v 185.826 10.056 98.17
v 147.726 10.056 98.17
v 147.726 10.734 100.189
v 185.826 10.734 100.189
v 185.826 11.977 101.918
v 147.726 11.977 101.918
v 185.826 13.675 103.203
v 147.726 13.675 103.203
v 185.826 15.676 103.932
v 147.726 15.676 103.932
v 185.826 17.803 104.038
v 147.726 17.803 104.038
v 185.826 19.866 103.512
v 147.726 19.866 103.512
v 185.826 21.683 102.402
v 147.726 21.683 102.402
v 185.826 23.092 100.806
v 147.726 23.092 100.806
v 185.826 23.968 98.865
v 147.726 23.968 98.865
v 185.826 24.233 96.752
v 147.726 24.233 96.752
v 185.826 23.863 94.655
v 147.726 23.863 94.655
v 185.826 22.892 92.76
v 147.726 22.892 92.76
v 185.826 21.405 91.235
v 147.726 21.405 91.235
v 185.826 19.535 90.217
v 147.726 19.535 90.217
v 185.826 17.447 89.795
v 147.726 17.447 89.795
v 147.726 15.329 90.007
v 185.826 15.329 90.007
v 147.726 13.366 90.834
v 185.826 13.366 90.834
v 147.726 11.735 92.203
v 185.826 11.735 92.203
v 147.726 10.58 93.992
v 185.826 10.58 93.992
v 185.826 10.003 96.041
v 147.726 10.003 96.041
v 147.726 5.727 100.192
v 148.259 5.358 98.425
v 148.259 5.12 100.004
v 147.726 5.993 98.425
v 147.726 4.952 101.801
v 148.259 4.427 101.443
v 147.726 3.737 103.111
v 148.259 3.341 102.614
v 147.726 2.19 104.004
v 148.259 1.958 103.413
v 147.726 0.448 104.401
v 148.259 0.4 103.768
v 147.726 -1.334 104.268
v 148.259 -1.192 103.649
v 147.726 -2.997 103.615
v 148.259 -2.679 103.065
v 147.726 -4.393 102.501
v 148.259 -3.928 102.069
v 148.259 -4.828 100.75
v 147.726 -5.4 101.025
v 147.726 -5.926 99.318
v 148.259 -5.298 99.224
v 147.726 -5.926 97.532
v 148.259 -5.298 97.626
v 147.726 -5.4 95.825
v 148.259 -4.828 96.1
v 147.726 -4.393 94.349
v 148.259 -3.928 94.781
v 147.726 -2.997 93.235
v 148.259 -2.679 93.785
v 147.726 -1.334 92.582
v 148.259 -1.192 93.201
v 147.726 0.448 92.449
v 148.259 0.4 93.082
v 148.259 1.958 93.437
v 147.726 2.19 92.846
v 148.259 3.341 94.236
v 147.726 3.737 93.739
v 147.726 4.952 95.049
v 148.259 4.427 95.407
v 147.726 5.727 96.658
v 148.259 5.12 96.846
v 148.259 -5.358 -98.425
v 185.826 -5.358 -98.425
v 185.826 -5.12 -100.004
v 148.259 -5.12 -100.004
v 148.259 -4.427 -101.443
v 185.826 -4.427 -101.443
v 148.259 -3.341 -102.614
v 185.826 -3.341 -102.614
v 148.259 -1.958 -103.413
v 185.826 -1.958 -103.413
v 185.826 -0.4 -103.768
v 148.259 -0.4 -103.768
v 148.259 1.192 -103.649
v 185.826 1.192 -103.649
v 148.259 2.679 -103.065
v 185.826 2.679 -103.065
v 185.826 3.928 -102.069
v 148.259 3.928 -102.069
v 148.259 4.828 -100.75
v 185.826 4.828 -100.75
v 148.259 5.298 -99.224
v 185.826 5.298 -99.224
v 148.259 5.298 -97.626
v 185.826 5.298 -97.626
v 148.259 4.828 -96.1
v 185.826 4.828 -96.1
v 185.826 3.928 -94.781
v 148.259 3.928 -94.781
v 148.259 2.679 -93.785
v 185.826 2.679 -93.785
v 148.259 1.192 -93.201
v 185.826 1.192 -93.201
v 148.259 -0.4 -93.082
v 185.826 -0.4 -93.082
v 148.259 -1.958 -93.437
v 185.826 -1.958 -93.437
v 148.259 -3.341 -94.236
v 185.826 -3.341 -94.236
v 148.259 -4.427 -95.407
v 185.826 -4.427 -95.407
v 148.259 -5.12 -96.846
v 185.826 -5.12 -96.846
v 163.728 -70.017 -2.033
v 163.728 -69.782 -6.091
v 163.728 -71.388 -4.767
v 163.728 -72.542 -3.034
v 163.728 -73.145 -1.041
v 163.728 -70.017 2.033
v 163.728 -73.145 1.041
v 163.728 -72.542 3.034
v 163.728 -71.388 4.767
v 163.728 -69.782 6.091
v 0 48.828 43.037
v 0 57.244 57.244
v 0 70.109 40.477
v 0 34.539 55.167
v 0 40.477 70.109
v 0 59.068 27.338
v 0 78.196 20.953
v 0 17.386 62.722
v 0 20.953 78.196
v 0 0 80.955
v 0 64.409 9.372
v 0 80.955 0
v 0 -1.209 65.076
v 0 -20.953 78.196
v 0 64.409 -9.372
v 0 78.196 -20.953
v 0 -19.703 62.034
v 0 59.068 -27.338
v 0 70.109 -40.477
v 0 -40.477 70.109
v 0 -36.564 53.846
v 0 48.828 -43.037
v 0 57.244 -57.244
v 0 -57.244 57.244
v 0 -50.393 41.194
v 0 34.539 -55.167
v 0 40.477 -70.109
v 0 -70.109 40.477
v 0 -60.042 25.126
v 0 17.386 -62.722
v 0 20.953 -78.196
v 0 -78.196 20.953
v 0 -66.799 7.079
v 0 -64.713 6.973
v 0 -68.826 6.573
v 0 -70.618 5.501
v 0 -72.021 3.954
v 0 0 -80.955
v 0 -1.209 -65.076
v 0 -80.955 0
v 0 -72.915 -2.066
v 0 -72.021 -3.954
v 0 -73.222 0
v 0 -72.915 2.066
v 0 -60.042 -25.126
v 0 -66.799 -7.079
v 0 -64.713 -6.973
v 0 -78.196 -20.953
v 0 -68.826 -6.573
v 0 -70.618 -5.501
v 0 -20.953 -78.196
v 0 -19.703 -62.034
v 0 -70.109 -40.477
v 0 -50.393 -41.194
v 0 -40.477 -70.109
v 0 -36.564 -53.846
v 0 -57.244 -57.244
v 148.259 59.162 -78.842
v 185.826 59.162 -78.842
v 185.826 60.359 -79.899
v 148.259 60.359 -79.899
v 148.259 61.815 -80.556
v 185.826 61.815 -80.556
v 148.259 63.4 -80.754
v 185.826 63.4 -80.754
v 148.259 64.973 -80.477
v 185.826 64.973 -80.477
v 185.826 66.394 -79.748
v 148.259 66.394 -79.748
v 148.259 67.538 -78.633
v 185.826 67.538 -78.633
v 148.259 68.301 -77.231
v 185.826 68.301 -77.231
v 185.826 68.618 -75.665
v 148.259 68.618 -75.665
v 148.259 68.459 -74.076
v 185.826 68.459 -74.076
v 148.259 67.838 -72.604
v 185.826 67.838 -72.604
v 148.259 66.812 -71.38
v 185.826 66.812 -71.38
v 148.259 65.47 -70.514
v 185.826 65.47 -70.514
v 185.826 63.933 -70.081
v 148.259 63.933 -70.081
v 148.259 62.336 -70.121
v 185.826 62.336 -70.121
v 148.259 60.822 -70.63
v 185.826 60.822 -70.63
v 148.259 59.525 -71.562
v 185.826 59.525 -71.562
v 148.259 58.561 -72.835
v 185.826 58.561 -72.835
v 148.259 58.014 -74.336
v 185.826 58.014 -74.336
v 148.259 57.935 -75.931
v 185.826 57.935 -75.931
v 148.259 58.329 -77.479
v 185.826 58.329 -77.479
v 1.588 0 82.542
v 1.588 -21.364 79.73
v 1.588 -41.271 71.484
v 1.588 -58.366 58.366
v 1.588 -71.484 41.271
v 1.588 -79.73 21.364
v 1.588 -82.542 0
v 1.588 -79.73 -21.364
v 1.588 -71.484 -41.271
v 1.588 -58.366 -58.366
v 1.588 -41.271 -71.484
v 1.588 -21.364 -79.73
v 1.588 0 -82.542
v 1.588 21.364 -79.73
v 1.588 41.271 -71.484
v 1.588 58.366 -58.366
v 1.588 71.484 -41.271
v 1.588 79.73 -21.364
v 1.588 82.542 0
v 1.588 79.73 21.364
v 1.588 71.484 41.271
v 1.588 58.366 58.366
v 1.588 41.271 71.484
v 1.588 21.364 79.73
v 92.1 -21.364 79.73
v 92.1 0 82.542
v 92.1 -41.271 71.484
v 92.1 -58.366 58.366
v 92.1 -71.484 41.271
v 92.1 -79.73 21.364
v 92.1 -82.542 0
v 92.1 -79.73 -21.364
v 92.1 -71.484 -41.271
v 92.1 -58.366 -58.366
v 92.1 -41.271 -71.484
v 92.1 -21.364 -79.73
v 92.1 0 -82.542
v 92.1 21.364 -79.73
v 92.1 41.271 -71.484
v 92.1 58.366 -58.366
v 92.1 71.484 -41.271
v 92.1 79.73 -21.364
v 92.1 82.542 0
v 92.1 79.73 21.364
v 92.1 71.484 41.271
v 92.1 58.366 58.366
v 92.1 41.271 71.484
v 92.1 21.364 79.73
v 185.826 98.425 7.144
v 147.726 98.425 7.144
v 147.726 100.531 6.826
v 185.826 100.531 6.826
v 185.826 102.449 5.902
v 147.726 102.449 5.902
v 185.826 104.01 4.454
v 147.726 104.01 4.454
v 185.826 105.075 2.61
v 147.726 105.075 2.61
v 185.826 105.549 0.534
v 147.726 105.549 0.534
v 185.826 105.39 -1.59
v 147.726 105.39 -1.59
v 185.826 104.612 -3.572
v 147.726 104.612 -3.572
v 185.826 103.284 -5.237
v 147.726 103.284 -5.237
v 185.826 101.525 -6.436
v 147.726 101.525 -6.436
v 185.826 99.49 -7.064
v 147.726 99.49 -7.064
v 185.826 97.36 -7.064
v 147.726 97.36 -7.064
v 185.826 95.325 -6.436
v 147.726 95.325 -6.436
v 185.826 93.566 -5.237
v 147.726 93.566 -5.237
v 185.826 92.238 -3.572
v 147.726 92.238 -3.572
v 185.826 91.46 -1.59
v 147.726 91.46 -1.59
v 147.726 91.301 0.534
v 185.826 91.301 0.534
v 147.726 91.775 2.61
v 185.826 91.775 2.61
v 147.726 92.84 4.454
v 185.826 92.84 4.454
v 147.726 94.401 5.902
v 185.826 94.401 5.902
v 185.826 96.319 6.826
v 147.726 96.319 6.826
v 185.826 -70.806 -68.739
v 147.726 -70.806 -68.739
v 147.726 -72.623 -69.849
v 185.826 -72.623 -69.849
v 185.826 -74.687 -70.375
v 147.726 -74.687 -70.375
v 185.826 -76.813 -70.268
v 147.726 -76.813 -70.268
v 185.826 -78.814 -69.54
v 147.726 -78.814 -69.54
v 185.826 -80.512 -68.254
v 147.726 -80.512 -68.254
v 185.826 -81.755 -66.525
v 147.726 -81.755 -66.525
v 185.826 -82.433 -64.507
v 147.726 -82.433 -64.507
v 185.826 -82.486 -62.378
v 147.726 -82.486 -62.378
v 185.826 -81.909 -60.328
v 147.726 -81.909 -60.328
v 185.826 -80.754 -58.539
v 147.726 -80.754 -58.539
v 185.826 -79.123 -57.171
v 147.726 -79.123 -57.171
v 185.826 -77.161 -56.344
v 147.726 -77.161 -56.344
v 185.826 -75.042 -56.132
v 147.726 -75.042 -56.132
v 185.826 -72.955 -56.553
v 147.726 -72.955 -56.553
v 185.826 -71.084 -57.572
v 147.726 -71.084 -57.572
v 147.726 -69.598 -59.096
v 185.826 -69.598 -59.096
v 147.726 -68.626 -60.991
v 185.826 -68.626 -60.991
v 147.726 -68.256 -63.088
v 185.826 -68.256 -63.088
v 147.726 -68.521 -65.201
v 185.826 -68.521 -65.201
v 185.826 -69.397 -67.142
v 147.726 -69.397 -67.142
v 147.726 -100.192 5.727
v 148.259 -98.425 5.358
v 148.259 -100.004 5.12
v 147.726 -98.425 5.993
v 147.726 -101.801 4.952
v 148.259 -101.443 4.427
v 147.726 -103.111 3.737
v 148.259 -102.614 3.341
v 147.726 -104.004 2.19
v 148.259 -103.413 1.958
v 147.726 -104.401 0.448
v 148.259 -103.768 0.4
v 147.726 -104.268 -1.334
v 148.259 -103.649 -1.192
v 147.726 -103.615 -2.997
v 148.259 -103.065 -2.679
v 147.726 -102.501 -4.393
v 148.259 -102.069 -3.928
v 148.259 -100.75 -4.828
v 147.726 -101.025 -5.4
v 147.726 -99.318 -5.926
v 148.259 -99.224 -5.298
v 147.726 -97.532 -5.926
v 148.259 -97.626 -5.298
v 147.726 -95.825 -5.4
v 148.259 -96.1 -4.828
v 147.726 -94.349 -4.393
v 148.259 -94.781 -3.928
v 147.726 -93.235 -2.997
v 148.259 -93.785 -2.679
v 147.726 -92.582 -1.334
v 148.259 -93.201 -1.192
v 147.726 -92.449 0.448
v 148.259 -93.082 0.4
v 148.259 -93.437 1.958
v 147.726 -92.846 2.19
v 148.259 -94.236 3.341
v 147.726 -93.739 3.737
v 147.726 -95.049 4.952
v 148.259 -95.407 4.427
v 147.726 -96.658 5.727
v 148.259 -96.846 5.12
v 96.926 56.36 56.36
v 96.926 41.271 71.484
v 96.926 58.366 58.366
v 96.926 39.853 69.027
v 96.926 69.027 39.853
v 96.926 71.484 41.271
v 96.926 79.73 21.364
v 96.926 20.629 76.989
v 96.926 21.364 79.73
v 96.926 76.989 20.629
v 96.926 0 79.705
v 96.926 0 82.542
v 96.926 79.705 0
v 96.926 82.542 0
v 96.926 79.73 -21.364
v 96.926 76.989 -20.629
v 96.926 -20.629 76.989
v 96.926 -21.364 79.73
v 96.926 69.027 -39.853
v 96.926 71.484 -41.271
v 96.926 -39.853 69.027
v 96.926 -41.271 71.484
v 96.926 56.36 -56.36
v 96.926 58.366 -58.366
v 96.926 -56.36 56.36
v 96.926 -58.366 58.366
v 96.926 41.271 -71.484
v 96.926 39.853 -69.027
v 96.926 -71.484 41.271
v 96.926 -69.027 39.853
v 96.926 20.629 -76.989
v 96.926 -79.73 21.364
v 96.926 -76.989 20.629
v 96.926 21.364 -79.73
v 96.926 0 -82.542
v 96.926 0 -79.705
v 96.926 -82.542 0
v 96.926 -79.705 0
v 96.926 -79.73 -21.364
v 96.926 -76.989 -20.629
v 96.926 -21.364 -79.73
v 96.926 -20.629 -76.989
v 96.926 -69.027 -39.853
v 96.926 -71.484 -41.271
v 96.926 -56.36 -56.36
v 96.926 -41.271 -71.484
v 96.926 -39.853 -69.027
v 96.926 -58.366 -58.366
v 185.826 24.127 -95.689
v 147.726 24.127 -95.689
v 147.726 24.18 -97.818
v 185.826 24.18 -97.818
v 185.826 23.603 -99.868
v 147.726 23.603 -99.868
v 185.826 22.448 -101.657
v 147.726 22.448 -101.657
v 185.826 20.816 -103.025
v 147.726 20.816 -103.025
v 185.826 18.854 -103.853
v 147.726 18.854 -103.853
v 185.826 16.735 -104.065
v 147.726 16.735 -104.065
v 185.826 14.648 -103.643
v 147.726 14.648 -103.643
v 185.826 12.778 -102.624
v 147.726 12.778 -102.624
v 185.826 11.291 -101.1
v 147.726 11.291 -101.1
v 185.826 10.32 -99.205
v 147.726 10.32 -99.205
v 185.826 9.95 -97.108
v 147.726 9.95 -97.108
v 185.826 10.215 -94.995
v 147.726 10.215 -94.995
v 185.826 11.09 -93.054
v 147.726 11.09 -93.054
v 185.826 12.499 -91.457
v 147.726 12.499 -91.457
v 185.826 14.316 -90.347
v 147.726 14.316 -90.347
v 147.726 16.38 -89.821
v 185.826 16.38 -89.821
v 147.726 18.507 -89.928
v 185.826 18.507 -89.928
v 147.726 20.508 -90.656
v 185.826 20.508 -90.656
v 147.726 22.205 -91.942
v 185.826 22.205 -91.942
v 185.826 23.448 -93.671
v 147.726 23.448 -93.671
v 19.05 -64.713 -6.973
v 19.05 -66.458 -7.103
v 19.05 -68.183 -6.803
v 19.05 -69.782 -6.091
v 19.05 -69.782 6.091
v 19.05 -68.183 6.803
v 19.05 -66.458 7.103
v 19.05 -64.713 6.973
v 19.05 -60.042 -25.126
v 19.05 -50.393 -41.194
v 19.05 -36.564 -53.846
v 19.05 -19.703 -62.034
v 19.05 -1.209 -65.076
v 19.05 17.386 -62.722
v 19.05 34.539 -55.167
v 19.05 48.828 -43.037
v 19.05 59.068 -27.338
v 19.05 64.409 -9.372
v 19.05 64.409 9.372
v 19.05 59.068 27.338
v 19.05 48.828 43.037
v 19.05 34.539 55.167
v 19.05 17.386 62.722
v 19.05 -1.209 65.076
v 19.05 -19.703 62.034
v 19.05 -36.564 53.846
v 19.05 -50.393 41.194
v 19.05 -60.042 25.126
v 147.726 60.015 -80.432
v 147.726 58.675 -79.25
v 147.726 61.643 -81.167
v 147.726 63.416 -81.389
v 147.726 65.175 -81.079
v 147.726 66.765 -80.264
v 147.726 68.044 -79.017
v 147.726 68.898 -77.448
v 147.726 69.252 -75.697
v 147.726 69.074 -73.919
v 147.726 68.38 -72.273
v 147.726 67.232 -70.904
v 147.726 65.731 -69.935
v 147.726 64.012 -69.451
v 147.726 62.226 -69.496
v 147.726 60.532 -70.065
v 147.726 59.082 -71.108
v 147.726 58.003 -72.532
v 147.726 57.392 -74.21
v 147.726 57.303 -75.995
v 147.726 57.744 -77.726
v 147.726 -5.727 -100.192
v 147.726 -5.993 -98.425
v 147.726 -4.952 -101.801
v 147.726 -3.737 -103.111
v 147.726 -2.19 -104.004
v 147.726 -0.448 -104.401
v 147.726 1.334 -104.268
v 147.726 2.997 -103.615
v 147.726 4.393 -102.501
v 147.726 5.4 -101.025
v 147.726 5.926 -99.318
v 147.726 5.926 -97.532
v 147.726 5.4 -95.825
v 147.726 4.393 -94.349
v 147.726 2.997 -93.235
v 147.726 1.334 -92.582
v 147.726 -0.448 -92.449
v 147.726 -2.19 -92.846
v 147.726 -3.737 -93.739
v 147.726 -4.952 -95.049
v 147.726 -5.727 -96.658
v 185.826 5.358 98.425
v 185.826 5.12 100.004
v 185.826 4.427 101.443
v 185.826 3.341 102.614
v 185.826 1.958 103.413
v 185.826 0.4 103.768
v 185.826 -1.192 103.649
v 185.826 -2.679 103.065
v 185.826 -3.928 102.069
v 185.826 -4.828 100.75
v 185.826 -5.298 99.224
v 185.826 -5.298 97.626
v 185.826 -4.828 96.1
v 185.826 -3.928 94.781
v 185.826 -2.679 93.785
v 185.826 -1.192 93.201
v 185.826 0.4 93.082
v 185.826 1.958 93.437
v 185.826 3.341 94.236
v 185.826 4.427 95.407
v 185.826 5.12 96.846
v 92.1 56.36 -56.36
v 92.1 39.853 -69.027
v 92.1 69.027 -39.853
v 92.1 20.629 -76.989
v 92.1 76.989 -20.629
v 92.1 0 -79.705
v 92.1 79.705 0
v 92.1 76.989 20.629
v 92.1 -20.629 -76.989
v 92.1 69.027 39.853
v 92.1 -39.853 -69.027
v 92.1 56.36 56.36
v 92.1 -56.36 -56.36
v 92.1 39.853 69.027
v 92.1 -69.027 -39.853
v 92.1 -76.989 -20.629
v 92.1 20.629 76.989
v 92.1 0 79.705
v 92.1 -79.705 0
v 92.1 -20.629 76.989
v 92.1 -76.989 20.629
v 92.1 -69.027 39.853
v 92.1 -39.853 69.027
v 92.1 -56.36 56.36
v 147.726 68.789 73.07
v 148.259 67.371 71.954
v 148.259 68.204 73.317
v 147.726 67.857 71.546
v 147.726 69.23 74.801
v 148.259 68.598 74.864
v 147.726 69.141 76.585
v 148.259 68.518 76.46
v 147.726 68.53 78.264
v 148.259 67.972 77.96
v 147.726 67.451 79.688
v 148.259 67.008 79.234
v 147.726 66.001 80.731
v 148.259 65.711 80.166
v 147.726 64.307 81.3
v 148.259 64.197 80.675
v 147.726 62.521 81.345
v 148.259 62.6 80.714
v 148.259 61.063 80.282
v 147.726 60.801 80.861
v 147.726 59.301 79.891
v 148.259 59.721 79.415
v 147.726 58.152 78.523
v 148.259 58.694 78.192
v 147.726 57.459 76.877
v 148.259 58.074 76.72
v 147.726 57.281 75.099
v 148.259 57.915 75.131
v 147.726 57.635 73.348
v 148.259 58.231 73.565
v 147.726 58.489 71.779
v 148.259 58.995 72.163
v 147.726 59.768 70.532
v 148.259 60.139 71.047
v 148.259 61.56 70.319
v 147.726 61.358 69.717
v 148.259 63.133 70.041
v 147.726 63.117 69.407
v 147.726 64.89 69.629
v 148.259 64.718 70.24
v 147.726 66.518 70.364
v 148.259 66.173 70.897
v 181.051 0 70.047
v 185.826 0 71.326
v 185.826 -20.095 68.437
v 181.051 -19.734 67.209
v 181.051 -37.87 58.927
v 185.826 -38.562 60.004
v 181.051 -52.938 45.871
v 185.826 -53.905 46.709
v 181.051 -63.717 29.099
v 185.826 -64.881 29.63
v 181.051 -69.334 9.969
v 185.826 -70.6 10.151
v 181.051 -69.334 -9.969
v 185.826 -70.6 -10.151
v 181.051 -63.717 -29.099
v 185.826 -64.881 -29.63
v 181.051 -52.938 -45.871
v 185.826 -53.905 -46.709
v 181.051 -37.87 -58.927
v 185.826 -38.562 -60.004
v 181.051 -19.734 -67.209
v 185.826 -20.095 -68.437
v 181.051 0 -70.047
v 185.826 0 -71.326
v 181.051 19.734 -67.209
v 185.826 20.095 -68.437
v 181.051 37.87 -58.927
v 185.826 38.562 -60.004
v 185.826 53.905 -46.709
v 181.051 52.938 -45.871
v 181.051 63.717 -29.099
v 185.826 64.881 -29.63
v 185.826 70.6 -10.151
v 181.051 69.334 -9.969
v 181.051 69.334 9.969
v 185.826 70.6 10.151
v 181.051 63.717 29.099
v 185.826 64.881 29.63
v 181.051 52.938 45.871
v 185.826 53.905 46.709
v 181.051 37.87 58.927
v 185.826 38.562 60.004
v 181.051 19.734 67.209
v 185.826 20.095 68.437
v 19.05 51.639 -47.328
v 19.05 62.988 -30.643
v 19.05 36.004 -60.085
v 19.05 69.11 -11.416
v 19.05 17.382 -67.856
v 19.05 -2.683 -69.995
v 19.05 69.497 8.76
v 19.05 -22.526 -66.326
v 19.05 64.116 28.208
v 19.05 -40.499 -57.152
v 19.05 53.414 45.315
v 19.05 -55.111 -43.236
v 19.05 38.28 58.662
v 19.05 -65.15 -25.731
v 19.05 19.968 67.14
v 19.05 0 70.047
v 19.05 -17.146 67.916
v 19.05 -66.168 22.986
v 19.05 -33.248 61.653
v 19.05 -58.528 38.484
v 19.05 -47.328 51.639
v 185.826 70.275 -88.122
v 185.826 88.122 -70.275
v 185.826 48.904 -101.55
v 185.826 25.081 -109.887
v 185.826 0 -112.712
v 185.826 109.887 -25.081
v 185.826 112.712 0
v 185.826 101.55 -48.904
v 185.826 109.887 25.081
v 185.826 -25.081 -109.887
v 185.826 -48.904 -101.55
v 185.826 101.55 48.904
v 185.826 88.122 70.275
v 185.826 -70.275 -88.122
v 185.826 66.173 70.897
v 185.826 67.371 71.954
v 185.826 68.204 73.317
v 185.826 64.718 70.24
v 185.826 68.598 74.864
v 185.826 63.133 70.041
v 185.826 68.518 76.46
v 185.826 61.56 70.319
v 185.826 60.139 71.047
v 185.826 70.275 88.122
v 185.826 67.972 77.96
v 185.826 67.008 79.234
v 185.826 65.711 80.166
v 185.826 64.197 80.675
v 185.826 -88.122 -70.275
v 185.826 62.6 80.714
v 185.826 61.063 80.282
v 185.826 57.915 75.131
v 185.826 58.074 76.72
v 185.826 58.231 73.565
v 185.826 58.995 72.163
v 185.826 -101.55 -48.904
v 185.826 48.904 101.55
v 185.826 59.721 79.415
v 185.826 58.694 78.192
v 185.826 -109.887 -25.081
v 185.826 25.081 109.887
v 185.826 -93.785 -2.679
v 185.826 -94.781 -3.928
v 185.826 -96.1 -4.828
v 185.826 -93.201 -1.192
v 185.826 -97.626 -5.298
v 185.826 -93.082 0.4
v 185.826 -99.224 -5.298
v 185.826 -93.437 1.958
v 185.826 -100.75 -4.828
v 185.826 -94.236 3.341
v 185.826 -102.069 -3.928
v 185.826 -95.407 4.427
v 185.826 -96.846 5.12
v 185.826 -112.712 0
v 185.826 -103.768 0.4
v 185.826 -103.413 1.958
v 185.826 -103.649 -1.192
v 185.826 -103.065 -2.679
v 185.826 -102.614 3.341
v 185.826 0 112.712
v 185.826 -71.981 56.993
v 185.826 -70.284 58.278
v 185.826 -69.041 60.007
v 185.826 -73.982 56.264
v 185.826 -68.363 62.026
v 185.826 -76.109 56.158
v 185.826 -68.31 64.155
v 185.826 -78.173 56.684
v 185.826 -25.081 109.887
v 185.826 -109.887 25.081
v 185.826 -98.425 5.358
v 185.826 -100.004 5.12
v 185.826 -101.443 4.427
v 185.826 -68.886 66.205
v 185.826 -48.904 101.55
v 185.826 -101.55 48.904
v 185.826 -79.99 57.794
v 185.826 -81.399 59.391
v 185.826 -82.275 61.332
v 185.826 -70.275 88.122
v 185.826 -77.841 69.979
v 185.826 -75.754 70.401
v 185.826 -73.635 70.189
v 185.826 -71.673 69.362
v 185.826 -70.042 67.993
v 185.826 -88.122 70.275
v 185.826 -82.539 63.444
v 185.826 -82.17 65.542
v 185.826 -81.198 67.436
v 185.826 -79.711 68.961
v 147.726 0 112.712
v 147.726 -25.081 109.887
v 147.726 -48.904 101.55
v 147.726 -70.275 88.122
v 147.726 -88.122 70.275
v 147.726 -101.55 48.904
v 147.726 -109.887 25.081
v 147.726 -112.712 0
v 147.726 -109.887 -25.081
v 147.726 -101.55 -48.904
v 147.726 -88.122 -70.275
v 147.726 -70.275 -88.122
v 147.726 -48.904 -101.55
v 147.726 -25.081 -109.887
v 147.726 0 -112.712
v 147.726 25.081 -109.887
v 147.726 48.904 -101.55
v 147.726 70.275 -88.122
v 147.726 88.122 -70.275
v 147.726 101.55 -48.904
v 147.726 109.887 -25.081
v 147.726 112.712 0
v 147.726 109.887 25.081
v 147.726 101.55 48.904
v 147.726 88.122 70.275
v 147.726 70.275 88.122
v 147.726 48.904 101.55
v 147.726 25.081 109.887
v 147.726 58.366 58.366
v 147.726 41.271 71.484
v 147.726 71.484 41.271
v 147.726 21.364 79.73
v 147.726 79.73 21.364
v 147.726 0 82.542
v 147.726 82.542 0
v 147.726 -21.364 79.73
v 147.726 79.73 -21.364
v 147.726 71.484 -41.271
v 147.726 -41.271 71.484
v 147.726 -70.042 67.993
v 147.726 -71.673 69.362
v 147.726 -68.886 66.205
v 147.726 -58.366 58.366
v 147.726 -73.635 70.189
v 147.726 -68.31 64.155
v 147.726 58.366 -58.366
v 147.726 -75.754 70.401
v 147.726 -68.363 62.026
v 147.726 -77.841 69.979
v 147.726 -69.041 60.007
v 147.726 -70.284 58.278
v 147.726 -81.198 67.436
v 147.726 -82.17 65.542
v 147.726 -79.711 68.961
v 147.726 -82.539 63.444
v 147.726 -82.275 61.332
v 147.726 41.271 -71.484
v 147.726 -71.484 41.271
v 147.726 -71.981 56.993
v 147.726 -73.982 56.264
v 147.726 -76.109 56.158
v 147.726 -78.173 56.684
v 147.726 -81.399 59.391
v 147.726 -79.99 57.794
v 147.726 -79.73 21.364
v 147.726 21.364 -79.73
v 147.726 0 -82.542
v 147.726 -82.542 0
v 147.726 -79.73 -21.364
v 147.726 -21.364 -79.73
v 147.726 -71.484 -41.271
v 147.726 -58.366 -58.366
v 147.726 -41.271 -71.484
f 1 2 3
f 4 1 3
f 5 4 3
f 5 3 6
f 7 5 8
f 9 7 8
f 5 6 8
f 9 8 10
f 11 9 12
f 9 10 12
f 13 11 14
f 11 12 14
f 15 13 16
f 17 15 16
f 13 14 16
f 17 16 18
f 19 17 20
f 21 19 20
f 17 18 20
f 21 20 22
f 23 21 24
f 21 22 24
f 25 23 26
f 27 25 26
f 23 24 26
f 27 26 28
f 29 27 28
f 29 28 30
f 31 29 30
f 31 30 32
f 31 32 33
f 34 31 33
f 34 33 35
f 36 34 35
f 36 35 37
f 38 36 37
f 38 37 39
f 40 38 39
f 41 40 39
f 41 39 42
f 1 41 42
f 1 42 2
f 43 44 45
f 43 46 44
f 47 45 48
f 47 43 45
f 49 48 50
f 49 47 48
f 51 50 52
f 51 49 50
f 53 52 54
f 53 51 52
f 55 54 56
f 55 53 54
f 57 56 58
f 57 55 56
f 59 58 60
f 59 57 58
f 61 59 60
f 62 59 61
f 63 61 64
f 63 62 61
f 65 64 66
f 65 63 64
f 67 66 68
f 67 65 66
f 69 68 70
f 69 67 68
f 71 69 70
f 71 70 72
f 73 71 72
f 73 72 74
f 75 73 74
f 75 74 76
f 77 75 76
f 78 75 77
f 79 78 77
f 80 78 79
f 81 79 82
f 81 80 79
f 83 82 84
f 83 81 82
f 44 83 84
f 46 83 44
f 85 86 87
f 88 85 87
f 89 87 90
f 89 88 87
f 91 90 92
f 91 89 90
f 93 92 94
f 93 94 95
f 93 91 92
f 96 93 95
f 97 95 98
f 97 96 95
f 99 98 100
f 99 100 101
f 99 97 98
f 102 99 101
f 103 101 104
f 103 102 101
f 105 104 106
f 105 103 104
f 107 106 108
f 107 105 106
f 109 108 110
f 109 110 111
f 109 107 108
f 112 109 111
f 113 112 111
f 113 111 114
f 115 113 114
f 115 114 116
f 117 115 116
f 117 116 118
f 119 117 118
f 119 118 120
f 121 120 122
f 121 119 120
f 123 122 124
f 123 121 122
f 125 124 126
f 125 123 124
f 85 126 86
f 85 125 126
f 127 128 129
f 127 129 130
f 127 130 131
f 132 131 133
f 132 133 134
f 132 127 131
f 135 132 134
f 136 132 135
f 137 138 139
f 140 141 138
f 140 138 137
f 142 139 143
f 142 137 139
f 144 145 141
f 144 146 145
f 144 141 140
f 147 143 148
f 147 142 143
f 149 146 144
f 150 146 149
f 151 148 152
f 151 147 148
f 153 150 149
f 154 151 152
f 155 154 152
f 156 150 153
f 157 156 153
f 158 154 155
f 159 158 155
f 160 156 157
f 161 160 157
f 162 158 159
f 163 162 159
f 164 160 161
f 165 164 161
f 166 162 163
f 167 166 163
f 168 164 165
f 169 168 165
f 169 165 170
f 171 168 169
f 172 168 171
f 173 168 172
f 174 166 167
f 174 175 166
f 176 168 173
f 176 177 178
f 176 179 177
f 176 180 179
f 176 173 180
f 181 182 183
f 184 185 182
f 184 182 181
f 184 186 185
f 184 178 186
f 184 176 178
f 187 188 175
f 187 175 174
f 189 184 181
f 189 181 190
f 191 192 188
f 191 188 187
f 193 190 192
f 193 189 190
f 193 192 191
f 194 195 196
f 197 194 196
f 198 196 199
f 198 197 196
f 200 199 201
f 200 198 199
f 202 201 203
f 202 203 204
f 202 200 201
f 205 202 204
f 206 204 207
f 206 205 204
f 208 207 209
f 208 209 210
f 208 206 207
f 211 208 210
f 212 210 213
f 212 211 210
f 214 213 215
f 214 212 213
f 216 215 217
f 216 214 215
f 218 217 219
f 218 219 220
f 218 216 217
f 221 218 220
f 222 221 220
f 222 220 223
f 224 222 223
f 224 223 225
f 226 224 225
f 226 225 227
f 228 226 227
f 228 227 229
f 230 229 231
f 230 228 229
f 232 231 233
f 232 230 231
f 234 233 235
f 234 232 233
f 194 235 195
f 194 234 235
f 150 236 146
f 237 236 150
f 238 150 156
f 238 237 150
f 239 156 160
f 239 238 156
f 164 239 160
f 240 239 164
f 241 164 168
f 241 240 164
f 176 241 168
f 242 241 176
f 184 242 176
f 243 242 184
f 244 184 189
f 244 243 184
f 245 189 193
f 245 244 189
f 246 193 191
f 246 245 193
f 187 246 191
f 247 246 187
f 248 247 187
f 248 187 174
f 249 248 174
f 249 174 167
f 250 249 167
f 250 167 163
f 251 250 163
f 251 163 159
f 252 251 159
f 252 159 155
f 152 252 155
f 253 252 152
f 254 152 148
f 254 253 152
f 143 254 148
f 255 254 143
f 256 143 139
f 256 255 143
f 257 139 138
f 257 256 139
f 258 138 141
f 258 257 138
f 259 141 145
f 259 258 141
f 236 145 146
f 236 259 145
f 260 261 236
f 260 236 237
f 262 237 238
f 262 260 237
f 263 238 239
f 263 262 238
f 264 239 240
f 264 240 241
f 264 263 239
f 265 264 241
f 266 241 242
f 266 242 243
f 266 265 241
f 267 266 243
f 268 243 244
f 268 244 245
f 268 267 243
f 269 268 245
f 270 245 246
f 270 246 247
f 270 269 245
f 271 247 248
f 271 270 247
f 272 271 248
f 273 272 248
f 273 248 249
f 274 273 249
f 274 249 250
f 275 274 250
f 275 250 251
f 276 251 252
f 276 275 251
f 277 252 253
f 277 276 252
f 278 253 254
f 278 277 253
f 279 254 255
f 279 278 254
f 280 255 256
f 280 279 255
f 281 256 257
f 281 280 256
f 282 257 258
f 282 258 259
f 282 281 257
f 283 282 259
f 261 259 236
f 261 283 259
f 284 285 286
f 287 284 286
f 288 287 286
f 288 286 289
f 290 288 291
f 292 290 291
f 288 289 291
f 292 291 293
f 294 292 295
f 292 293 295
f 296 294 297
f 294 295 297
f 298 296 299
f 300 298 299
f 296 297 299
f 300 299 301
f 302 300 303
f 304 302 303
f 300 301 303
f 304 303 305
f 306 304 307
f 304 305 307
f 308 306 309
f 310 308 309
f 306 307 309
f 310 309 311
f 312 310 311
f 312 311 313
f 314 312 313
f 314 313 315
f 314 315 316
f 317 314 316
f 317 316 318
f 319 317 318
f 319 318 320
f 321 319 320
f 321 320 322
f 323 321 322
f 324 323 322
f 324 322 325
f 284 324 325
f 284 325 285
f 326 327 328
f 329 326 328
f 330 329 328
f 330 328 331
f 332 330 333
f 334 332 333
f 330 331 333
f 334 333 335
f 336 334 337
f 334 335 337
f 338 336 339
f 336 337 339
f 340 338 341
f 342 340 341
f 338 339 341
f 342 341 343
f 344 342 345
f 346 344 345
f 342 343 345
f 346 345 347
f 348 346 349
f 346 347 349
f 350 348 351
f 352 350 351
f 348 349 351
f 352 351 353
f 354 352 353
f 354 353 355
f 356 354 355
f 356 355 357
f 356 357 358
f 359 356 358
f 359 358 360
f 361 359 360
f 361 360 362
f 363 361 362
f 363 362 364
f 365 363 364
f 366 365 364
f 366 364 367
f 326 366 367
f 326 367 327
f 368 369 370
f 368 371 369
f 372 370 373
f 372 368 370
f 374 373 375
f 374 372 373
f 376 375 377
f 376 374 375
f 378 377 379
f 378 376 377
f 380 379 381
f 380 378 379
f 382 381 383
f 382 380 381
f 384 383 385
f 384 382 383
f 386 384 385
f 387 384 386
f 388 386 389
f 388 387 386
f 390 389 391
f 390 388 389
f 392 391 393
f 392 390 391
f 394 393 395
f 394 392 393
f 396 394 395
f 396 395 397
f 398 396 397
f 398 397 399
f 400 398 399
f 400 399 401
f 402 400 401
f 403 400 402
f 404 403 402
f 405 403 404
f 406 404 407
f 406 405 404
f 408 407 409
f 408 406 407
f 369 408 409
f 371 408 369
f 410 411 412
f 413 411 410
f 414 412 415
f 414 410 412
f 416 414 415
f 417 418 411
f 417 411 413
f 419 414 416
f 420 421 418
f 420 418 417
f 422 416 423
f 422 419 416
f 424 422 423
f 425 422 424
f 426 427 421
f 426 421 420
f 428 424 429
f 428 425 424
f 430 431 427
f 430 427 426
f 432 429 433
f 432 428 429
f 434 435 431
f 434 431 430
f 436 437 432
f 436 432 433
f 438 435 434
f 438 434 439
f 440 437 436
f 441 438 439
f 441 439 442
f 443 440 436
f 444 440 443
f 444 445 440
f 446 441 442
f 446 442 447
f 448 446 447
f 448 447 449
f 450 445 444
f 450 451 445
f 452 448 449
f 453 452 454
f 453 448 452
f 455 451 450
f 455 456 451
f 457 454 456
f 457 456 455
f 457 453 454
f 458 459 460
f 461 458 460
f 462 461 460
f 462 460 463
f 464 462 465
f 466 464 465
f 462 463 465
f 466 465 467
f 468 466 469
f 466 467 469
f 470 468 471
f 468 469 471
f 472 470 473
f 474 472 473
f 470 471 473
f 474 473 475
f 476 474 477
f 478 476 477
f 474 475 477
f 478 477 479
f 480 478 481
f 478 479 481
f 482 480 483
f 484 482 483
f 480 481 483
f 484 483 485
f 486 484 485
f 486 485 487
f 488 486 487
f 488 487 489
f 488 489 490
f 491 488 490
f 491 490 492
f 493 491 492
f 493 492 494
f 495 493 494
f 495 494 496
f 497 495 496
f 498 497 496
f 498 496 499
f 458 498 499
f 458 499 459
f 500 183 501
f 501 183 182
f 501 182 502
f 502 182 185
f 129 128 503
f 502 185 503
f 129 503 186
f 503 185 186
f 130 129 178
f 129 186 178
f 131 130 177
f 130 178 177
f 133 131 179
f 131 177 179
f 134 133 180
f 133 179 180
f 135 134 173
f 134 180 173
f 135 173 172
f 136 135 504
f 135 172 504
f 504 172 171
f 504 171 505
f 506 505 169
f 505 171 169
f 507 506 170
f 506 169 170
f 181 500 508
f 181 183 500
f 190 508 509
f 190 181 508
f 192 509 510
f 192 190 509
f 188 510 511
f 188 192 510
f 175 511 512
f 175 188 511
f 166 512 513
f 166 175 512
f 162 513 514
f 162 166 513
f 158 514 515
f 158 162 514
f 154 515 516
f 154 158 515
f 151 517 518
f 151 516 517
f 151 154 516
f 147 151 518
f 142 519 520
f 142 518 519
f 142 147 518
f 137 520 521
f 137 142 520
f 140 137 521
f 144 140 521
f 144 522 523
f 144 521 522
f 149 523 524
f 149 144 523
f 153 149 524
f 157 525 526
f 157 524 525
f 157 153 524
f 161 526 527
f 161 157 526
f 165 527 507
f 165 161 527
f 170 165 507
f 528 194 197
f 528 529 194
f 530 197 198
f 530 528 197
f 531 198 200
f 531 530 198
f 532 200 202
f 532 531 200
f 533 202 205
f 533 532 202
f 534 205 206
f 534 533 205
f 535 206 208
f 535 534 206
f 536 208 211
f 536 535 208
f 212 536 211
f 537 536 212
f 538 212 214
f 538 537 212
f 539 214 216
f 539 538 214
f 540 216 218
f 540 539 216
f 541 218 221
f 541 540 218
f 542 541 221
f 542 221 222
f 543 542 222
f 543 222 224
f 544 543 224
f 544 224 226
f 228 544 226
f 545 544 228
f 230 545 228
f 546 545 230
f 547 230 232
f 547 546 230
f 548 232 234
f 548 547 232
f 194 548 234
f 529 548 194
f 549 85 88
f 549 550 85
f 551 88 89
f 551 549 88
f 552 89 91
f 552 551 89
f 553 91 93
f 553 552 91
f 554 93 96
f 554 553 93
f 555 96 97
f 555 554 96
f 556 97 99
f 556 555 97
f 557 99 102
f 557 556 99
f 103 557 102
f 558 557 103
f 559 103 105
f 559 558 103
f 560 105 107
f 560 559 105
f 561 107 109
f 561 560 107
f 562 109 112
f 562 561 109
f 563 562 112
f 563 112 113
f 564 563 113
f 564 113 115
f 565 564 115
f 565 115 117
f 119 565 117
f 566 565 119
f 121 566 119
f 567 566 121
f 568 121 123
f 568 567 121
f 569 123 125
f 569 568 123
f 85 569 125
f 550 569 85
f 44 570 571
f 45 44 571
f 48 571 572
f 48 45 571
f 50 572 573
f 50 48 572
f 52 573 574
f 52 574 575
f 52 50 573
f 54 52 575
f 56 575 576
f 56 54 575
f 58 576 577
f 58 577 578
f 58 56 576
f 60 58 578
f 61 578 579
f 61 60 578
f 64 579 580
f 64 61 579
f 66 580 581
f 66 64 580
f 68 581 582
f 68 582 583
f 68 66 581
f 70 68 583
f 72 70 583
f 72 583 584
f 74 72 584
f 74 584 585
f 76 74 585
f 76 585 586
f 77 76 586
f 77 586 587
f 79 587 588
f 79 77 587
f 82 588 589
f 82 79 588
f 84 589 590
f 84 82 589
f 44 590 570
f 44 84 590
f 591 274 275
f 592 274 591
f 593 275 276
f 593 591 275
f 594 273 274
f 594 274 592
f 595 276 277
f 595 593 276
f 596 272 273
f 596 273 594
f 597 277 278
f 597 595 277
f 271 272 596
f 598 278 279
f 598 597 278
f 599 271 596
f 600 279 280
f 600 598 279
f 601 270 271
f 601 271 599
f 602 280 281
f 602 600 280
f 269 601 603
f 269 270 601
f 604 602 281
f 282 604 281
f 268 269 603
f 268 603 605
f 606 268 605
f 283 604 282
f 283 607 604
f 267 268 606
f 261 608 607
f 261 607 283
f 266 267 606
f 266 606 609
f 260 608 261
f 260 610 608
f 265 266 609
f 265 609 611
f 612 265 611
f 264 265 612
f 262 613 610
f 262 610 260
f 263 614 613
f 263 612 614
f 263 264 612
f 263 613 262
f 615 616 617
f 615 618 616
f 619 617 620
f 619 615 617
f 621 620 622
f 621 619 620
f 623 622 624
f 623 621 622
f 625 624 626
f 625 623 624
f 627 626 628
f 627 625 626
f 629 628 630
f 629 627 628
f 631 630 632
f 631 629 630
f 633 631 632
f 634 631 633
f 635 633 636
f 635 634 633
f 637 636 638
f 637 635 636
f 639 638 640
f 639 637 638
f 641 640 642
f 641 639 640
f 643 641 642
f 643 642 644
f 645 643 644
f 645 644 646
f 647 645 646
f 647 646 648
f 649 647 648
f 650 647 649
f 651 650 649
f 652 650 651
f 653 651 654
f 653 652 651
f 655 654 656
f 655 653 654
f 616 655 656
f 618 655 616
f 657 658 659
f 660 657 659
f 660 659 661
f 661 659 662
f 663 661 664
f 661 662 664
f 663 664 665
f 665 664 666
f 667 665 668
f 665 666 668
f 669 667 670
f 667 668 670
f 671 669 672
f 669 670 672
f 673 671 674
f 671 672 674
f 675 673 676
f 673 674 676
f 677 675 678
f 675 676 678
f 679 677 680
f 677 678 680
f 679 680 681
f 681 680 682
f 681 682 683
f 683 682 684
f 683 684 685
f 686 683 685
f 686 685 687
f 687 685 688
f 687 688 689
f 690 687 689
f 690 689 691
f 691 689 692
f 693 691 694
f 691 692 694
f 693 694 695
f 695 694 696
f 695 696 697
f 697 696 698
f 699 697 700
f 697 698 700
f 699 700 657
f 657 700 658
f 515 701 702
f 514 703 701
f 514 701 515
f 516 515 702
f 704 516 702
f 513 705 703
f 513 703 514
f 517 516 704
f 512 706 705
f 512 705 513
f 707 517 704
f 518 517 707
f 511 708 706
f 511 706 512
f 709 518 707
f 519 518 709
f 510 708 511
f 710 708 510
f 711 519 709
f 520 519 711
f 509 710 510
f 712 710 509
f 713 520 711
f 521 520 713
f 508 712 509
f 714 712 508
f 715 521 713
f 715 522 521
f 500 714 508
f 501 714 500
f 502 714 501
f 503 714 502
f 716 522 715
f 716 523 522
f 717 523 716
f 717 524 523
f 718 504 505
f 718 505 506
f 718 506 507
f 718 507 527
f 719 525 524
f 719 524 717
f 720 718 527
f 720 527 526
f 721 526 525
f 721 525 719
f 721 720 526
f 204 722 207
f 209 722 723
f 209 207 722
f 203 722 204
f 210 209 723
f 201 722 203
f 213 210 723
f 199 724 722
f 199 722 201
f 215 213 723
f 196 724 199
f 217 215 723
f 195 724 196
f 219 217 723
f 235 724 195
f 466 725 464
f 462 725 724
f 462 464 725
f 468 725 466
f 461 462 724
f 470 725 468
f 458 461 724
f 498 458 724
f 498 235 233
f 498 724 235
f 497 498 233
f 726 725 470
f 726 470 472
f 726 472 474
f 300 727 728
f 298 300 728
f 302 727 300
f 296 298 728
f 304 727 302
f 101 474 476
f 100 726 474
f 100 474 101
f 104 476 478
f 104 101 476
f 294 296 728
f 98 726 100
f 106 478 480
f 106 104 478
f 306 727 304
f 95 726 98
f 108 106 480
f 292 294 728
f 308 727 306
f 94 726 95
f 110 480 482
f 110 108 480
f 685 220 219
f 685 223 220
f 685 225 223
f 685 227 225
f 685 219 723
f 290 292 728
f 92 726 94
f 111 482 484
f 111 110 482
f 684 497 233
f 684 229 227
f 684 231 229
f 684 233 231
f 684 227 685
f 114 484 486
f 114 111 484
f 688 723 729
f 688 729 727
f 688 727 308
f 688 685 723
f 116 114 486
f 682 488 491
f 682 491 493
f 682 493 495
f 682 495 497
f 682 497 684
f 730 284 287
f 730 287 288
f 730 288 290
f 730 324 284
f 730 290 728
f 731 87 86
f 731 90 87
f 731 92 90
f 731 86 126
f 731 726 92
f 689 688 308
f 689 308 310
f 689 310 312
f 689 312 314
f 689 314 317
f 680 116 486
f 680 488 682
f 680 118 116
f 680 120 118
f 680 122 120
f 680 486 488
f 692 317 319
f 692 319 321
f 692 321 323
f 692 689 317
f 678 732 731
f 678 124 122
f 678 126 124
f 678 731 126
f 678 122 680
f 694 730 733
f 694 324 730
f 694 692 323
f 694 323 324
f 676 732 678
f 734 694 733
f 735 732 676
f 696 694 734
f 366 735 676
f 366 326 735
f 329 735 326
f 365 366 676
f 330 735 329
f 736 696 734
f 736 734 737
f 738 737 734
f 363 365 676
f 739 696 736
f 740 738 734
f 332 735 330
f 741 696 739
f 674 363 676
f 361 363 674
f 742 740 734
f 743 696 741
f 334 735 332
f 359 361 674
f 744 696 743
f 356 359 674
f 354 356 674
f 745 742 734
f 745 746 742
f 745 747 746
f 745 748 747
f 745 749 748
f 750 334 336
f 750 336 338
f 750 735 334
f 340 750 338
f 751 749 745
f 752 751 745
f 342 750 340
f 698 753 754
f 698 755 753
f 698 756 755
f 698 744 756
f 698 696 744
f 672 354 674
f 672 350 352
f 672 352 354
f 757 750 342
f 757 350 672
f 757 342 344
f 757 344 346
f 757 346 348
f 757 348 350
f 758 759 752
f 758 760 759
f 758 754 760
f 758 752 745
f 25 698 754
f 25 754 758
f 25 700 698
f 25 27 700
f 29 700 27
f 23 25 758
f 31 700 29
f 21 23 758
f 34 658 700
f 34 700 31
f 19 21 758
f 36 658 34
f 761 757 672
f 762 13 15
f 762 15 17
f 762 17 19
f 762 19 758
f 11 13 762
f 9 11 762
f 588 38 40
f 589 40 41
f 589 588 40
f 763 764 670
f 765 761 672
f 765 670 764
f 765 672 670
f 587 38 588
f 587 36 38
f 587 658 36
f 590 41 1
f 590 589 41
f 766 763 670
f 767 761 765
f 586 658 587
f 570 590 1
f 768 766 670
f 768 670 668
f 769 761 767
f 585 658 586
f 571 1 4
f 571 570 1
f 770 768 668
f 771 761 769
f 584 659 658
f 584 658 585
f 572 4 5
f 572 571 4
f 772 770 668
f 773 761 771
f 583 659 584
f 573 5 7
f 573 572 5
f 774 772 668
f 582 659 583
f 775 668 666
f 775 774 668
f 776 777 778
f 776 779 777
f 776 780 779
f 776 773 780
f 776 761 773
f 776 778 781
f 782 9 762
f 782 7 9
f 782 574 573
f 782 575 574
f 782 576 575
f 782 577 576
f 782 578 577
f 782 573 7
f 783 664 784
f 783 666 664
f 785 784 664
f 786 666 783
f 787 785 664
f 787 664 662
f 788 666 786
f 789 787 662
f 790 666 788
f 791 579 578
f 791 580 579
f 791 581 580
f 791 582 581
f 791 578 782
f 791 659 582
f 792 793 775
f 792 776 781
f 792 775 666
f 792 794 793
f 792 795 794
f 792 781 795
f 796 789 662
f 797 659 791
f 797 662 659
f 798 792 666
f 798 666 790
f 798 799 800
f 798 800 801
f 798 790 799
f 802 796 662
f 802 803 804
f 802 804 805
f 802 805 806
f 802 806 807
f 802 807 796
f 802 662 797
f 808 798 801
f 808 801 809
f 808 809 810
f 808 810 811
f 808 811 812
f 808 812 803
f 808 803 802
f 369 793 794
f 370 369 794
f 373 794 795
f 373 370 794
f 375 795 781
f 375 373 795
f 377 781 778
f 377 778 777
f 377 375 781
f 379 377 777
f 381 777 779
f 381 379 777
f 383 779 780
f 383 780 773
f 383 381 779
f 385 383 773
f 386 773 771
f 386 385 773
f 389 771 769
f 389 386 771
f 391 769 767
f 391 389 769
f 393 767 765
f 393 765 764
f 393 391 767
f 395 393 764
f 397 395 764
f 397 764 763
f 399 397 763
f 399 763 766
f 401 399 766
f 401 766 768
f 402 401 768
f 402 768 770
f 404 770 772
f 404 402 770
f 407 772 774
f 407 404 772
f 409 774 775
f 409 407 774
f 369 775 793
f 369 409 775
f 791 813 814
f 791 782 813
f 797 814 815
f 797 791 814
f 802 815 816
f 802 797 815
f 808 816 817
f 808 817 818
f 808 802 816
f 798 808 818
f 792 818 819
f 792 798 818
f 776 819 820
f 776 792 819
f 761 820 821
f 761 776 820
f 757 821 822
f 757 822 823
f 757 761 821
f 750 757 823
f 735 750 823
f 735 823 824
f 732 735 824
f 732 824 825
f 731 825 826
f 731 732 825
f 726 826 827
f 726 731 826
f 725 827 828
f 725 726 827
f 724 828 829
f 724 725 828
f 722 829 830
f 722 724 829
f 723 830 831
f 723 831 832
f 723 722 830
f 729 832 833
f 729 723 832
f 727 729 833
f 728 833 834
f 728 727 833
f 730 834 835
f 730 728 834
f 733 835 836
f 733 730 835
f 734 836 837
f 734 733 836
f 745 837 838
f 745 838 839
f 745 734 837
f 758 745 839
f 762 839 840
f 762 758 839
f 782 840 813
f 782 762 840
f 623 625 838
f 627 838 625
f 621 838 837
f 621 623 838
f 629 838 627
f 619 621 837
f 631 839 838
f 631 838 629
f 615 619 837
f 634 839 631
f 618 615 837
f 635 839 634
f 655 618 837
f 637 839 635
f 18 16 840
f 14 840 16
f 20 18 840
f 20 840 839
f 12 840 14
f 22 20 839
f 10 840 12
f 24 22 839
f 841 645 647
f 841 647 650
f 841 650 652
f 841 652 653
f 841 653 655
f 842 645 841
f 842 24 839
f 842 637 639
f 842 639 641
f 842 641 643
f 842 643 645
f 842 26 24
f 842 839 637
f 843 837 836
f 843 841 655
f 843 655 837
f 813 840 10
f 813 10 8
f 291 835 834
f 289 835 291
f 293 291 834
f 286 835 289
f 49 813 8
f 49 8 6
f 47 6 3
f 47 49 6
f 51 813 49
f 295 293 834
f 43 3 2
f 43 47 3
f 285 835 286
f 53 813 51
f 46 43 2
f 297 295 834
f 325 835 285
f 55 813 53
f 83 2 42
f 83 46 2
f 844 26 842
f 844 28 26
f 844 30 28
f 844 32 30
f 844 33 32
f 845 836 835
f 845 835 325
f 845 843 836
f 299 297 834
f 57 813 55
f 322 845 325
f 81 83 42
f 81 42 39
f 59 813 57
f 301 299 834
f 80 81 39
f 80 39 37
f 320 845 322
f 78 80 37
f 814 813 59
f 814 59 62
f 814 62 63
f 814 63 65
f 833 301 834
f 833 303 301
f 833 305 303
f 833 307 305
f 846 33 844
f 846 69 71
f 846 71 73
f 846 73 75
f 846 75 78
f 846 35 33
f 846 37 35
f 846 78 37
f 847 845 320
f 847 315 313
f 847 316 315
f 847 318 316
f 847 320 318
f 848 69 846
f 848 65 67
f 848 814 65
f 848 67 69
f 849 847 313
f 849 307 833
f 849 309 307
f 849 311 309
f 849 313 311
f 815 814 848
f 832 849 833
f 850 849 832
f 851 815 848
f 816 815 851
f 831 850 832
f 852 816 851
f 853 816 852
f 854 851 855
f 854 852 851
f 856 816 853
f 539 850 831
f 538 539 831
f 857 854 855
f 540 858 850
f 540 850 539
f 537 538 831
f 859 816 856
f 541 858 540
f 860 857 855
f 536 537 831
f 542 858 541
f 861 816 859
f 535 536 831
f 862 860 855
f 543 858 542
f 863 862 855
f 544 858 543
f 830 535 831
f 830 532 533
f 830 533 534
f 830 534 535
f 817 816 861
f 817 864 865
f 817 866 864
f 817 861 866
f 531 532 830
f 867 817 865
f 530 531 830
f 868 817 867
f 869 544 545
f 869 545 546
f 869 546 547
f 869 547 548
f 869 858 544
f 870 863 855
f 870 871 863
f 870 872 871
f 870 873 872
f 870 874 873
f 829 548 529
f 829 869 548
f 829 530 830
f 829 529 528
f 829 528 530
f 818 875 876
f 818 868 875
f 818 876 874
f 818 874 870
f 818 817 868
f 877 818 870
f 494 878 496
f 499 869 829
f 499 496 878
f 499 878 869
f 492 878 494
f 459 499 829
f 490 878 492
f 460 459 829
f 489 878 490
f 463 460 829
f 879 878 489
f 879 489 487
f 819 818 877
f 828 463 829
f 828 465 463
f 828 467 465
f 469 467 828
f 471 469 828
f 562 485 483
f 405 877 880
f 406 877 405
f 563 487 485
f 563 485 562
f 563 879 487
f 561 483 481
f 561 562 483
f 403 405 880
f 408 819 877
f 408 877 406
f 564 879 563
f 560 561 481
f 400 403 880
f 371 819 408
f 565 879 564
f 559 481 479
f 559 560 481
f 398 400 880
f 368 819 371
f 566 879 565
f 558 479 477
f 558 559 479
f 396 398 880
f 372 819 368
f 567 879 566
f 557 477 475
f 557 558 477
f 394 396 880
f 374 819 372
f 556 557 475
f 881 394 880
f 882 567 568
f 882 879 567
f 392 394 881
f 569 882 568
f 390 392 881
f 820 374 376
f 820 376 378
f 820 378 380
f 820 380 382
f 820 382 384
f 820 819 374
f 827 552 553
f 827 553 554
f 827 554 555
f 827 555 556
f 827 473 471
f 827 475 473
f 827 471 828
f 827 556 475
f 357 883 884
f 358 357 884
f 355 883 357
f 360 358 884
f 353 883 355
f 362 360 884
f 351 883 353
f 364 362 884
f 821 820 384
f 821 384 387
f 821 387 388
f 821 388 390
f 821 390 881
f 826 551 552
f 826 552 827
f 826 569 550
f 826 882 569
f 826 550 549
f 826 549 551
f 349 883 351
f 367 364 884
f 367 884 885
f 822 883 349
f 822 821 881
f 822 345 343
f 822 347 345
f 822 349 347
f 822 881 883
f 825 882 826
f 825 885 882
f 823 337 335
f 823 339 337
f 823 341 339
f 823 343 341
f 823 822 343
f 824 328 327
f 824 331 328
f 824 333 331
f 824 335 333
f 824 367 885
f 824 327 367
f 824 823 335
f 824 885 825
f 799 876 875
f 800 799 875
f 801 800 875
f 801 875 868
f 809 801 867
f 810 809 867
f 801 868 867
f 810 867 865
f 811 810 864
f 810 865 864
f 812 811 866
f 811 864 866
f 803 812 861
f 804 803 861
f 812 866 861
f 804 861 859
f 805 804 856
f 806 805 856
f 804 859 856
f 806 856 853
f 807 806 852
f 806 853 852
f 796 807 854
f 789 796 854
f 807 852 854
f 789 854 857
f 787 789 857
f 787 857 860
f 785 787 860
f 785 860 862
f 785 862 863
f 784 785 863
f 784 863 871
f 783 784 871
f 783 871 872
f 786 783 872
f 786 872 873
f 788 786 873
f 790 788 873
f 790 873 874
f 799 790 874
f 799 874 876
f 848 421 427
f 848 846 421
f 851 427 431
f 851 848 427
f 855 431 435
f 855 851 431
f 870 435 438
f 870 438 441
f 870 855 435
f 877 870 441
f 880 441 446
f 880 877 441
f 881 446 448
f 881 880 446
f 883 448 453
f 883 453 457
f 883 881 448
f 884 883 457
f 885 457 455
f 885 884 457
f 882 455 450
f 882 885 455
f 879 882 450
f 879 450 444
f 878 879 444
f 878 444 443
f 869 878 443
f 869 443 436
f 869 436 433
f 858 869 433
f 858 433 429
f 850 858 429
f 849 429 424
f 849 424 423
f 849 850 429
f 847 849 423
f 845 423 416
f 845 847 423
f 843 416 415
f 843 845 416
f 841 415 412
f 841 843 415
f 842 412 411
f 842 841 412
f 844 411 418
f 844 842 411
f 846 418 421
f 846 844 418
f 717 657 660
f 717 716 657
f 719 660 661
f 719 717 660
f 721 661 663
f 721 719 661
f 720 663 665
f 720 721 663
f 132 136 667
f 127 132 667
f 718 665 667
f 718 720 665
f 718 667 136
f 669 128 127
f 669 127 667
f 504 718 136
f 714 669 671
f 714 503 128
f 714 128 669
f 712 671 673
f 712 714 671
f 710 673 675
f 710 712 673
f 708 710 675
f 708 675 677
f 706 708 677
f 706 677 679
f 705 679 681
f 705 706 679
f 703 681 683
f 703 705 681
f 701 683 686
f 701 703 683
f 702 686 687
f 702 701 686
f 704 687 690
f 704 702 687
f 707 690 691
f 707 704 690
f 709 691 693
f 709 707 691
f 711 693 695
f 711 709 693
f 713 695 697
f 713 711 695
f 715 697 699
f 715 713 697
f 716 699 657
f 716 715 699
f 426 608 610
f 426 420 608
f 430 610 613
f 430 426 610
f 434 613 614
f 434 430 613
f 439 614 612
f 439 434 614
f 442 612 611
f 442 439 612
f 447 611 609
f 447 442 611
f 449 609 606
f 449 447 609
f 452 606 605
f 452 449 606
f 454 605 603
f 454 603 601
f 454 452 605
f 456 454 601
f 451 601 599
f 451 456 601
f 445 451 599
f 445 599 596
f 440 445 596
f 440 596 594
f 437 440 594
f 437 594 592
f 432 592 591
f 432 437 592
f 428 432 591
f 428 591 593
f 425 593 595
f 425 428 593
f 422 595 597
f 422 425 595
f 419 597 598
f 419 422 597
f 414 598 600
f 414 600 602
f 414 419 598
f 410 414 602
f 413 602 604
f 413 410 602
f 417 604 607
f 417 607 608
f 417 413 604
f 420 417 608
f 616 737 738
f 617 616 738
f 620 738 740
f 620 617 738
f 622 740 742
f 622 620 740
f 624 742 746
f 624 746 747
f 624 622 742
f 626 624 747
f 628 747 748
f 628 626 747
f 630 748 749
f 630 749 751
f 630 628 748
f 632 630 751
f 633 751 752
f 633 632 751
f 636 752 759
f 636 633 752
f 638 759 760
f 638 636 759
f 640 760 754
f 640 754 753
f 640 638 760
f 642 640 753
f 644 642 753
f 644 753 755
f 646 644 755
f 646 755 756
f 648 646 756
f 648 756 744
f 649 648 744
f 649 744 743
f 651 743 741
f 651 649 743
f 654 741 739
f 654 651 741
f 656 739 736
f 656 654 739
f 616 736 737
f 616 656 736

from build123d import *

# Parameters (mm, degrees)
CHAMFER1_SIZE      = 1.5875
CHAMFER2_SIZE      = 4.7752
CHAMFER2_SIZE2     = 1.279510984
SKETCH2_R          = 7.112
CUT_EXTRUDE1_DEPTH = 163.7284
SKETCH3_R          = 7.14375
CUT_EXTRUDE2_DEPTH = 218.327643362
CIRPATTERN1_COUNT  = 18
CIRPATTERN2_COUNT  = 36


with BuildPart() as part:
    # Sketch1 → Revolve1 (revolve)
    with BuildSketch(Plane.XY, mode=Mode.PRIVATE) as revolve1_sk:
        Polygon((0, 65.0875), (0, 82.54238), (92.1004, 82.54238), (92.1004, 79.7052), (96.9264, 79.7052), (96.9264, 82.54238), (147.7264, 82.54238), (147.7264, 112.7125), (185.8264, 112.7125), (185.8264, 70.04685), (19.05, 70.04685), (19.05, 65.0875), align=None)
    revolve(revolve1_sk.sketch.rotate(Axis((0, 0, 0), (1, 0, 0)), 90), axis=Axis((0, 0, 0), (1, 0, 0)))

    # Chamfer1
    chamfer1_edges = [part.edges().sort_by_distance(p)[0] for p in [
        (0, 0, -82.54238),
    ]]
    chamfer(chamfer1_edges, length=CHAMFER1_SIZE)

    # Chamfer2
    chamfer2_edges = [part.edges().sort_by_distance(p)[0] for p in [
        (185.8264, 0, -70.04685),
    ]]
    chamfer2_side = [part.faces().sort_by_distance(p)[0] for p in [
        (102.4382, 0, -70.04685),
    ]]
    chamfer(chamfer2_edges, length=CHAMFER2_SIZE, length2=CHAMFER2_SIZE2, reference=chamfer2_side[0])

    # Sketch2 → Cut-Extrude1 (cut)
    with BuildSketch(Plane.ZY):
        with Locations((0, -66.10985)):
            Circle(SKETCH2_R)
    extrude(amount=-CUT_EXTRUDE1_DEPTH, mode=Mode.SUBTRACT)

    # Sketch3 → Cut-Extrude2 (cut, through all)
    with BuildSketch(Plane.ZY.offset(-147.7264)):
        with Locations((0, 98.425)):
            Circle(SKETCH3_R)
    cut_extrude2 = extrude(amount=-CUT_EXTRUDE2_DEPTH, mode=Mode.SUBTRACT)

    # CirPattern1: Cut-Extrude2 ×18 about axis, 13 skipped
    cirpattern1_axis = Axis((147.7264, 0, 0), (-1, 0, 0))
    add([cut_extrude2.rotate(cirpattern1_axis, i * 360 / CIRPATTERN1_COUNT) for i in range(1, CIRPATTERN1_COUNT) if i not in (1, 2, 3, 5, 6, 8, 9, 10, 12, 13, 15, 16, 17)], mode=Mode.SUBTRACT)

    # Sketch5 → Tap Drill for 1/2-13 Tap1 (revolve, cut)
    with BuildSketch(Plane(origin=(147.7264, -98.425, 0), x_dir=(0, 0, 1), z_dir=(0, 1, 0))):
        Polygon((0, 0), (0, 41.319489309), (5.35813, 38.1), (5.35813, 0.532828266), (5.99313, 0), align=None)
    tap_drill_for_1_2_13_tap1 = revolve(axis=Axis((141.3764, -98.425, 0), (1, 0, 0)), mode=Mode.SUBTRACT)

    # CirPattern2: Tap Drill for 1/2-13 Tap1 ×36 about axis, 31 skipped
    cirpattern2_axis = Axis((147.7264, 0, 0), (-1, 0, 0))
    add([tap_drill_for_1_2_13_tap1.rotate(cirpattern2_axis, i * 360 / CIRPATTERN2_COUNT) for i in range(1, CIRPATTERN2_COUNT) if i not in (1, 2, 3, 4, 5, 6, 7, 8, 10, 11, 12, 14, 15, 16, 17, 18, 19, 20, 21, 22, 24, 25, 26, 28, 29, 30, 31, 32, 33, 34, 35)], mode=Mode.SUBTRACT)


solid = part.part
